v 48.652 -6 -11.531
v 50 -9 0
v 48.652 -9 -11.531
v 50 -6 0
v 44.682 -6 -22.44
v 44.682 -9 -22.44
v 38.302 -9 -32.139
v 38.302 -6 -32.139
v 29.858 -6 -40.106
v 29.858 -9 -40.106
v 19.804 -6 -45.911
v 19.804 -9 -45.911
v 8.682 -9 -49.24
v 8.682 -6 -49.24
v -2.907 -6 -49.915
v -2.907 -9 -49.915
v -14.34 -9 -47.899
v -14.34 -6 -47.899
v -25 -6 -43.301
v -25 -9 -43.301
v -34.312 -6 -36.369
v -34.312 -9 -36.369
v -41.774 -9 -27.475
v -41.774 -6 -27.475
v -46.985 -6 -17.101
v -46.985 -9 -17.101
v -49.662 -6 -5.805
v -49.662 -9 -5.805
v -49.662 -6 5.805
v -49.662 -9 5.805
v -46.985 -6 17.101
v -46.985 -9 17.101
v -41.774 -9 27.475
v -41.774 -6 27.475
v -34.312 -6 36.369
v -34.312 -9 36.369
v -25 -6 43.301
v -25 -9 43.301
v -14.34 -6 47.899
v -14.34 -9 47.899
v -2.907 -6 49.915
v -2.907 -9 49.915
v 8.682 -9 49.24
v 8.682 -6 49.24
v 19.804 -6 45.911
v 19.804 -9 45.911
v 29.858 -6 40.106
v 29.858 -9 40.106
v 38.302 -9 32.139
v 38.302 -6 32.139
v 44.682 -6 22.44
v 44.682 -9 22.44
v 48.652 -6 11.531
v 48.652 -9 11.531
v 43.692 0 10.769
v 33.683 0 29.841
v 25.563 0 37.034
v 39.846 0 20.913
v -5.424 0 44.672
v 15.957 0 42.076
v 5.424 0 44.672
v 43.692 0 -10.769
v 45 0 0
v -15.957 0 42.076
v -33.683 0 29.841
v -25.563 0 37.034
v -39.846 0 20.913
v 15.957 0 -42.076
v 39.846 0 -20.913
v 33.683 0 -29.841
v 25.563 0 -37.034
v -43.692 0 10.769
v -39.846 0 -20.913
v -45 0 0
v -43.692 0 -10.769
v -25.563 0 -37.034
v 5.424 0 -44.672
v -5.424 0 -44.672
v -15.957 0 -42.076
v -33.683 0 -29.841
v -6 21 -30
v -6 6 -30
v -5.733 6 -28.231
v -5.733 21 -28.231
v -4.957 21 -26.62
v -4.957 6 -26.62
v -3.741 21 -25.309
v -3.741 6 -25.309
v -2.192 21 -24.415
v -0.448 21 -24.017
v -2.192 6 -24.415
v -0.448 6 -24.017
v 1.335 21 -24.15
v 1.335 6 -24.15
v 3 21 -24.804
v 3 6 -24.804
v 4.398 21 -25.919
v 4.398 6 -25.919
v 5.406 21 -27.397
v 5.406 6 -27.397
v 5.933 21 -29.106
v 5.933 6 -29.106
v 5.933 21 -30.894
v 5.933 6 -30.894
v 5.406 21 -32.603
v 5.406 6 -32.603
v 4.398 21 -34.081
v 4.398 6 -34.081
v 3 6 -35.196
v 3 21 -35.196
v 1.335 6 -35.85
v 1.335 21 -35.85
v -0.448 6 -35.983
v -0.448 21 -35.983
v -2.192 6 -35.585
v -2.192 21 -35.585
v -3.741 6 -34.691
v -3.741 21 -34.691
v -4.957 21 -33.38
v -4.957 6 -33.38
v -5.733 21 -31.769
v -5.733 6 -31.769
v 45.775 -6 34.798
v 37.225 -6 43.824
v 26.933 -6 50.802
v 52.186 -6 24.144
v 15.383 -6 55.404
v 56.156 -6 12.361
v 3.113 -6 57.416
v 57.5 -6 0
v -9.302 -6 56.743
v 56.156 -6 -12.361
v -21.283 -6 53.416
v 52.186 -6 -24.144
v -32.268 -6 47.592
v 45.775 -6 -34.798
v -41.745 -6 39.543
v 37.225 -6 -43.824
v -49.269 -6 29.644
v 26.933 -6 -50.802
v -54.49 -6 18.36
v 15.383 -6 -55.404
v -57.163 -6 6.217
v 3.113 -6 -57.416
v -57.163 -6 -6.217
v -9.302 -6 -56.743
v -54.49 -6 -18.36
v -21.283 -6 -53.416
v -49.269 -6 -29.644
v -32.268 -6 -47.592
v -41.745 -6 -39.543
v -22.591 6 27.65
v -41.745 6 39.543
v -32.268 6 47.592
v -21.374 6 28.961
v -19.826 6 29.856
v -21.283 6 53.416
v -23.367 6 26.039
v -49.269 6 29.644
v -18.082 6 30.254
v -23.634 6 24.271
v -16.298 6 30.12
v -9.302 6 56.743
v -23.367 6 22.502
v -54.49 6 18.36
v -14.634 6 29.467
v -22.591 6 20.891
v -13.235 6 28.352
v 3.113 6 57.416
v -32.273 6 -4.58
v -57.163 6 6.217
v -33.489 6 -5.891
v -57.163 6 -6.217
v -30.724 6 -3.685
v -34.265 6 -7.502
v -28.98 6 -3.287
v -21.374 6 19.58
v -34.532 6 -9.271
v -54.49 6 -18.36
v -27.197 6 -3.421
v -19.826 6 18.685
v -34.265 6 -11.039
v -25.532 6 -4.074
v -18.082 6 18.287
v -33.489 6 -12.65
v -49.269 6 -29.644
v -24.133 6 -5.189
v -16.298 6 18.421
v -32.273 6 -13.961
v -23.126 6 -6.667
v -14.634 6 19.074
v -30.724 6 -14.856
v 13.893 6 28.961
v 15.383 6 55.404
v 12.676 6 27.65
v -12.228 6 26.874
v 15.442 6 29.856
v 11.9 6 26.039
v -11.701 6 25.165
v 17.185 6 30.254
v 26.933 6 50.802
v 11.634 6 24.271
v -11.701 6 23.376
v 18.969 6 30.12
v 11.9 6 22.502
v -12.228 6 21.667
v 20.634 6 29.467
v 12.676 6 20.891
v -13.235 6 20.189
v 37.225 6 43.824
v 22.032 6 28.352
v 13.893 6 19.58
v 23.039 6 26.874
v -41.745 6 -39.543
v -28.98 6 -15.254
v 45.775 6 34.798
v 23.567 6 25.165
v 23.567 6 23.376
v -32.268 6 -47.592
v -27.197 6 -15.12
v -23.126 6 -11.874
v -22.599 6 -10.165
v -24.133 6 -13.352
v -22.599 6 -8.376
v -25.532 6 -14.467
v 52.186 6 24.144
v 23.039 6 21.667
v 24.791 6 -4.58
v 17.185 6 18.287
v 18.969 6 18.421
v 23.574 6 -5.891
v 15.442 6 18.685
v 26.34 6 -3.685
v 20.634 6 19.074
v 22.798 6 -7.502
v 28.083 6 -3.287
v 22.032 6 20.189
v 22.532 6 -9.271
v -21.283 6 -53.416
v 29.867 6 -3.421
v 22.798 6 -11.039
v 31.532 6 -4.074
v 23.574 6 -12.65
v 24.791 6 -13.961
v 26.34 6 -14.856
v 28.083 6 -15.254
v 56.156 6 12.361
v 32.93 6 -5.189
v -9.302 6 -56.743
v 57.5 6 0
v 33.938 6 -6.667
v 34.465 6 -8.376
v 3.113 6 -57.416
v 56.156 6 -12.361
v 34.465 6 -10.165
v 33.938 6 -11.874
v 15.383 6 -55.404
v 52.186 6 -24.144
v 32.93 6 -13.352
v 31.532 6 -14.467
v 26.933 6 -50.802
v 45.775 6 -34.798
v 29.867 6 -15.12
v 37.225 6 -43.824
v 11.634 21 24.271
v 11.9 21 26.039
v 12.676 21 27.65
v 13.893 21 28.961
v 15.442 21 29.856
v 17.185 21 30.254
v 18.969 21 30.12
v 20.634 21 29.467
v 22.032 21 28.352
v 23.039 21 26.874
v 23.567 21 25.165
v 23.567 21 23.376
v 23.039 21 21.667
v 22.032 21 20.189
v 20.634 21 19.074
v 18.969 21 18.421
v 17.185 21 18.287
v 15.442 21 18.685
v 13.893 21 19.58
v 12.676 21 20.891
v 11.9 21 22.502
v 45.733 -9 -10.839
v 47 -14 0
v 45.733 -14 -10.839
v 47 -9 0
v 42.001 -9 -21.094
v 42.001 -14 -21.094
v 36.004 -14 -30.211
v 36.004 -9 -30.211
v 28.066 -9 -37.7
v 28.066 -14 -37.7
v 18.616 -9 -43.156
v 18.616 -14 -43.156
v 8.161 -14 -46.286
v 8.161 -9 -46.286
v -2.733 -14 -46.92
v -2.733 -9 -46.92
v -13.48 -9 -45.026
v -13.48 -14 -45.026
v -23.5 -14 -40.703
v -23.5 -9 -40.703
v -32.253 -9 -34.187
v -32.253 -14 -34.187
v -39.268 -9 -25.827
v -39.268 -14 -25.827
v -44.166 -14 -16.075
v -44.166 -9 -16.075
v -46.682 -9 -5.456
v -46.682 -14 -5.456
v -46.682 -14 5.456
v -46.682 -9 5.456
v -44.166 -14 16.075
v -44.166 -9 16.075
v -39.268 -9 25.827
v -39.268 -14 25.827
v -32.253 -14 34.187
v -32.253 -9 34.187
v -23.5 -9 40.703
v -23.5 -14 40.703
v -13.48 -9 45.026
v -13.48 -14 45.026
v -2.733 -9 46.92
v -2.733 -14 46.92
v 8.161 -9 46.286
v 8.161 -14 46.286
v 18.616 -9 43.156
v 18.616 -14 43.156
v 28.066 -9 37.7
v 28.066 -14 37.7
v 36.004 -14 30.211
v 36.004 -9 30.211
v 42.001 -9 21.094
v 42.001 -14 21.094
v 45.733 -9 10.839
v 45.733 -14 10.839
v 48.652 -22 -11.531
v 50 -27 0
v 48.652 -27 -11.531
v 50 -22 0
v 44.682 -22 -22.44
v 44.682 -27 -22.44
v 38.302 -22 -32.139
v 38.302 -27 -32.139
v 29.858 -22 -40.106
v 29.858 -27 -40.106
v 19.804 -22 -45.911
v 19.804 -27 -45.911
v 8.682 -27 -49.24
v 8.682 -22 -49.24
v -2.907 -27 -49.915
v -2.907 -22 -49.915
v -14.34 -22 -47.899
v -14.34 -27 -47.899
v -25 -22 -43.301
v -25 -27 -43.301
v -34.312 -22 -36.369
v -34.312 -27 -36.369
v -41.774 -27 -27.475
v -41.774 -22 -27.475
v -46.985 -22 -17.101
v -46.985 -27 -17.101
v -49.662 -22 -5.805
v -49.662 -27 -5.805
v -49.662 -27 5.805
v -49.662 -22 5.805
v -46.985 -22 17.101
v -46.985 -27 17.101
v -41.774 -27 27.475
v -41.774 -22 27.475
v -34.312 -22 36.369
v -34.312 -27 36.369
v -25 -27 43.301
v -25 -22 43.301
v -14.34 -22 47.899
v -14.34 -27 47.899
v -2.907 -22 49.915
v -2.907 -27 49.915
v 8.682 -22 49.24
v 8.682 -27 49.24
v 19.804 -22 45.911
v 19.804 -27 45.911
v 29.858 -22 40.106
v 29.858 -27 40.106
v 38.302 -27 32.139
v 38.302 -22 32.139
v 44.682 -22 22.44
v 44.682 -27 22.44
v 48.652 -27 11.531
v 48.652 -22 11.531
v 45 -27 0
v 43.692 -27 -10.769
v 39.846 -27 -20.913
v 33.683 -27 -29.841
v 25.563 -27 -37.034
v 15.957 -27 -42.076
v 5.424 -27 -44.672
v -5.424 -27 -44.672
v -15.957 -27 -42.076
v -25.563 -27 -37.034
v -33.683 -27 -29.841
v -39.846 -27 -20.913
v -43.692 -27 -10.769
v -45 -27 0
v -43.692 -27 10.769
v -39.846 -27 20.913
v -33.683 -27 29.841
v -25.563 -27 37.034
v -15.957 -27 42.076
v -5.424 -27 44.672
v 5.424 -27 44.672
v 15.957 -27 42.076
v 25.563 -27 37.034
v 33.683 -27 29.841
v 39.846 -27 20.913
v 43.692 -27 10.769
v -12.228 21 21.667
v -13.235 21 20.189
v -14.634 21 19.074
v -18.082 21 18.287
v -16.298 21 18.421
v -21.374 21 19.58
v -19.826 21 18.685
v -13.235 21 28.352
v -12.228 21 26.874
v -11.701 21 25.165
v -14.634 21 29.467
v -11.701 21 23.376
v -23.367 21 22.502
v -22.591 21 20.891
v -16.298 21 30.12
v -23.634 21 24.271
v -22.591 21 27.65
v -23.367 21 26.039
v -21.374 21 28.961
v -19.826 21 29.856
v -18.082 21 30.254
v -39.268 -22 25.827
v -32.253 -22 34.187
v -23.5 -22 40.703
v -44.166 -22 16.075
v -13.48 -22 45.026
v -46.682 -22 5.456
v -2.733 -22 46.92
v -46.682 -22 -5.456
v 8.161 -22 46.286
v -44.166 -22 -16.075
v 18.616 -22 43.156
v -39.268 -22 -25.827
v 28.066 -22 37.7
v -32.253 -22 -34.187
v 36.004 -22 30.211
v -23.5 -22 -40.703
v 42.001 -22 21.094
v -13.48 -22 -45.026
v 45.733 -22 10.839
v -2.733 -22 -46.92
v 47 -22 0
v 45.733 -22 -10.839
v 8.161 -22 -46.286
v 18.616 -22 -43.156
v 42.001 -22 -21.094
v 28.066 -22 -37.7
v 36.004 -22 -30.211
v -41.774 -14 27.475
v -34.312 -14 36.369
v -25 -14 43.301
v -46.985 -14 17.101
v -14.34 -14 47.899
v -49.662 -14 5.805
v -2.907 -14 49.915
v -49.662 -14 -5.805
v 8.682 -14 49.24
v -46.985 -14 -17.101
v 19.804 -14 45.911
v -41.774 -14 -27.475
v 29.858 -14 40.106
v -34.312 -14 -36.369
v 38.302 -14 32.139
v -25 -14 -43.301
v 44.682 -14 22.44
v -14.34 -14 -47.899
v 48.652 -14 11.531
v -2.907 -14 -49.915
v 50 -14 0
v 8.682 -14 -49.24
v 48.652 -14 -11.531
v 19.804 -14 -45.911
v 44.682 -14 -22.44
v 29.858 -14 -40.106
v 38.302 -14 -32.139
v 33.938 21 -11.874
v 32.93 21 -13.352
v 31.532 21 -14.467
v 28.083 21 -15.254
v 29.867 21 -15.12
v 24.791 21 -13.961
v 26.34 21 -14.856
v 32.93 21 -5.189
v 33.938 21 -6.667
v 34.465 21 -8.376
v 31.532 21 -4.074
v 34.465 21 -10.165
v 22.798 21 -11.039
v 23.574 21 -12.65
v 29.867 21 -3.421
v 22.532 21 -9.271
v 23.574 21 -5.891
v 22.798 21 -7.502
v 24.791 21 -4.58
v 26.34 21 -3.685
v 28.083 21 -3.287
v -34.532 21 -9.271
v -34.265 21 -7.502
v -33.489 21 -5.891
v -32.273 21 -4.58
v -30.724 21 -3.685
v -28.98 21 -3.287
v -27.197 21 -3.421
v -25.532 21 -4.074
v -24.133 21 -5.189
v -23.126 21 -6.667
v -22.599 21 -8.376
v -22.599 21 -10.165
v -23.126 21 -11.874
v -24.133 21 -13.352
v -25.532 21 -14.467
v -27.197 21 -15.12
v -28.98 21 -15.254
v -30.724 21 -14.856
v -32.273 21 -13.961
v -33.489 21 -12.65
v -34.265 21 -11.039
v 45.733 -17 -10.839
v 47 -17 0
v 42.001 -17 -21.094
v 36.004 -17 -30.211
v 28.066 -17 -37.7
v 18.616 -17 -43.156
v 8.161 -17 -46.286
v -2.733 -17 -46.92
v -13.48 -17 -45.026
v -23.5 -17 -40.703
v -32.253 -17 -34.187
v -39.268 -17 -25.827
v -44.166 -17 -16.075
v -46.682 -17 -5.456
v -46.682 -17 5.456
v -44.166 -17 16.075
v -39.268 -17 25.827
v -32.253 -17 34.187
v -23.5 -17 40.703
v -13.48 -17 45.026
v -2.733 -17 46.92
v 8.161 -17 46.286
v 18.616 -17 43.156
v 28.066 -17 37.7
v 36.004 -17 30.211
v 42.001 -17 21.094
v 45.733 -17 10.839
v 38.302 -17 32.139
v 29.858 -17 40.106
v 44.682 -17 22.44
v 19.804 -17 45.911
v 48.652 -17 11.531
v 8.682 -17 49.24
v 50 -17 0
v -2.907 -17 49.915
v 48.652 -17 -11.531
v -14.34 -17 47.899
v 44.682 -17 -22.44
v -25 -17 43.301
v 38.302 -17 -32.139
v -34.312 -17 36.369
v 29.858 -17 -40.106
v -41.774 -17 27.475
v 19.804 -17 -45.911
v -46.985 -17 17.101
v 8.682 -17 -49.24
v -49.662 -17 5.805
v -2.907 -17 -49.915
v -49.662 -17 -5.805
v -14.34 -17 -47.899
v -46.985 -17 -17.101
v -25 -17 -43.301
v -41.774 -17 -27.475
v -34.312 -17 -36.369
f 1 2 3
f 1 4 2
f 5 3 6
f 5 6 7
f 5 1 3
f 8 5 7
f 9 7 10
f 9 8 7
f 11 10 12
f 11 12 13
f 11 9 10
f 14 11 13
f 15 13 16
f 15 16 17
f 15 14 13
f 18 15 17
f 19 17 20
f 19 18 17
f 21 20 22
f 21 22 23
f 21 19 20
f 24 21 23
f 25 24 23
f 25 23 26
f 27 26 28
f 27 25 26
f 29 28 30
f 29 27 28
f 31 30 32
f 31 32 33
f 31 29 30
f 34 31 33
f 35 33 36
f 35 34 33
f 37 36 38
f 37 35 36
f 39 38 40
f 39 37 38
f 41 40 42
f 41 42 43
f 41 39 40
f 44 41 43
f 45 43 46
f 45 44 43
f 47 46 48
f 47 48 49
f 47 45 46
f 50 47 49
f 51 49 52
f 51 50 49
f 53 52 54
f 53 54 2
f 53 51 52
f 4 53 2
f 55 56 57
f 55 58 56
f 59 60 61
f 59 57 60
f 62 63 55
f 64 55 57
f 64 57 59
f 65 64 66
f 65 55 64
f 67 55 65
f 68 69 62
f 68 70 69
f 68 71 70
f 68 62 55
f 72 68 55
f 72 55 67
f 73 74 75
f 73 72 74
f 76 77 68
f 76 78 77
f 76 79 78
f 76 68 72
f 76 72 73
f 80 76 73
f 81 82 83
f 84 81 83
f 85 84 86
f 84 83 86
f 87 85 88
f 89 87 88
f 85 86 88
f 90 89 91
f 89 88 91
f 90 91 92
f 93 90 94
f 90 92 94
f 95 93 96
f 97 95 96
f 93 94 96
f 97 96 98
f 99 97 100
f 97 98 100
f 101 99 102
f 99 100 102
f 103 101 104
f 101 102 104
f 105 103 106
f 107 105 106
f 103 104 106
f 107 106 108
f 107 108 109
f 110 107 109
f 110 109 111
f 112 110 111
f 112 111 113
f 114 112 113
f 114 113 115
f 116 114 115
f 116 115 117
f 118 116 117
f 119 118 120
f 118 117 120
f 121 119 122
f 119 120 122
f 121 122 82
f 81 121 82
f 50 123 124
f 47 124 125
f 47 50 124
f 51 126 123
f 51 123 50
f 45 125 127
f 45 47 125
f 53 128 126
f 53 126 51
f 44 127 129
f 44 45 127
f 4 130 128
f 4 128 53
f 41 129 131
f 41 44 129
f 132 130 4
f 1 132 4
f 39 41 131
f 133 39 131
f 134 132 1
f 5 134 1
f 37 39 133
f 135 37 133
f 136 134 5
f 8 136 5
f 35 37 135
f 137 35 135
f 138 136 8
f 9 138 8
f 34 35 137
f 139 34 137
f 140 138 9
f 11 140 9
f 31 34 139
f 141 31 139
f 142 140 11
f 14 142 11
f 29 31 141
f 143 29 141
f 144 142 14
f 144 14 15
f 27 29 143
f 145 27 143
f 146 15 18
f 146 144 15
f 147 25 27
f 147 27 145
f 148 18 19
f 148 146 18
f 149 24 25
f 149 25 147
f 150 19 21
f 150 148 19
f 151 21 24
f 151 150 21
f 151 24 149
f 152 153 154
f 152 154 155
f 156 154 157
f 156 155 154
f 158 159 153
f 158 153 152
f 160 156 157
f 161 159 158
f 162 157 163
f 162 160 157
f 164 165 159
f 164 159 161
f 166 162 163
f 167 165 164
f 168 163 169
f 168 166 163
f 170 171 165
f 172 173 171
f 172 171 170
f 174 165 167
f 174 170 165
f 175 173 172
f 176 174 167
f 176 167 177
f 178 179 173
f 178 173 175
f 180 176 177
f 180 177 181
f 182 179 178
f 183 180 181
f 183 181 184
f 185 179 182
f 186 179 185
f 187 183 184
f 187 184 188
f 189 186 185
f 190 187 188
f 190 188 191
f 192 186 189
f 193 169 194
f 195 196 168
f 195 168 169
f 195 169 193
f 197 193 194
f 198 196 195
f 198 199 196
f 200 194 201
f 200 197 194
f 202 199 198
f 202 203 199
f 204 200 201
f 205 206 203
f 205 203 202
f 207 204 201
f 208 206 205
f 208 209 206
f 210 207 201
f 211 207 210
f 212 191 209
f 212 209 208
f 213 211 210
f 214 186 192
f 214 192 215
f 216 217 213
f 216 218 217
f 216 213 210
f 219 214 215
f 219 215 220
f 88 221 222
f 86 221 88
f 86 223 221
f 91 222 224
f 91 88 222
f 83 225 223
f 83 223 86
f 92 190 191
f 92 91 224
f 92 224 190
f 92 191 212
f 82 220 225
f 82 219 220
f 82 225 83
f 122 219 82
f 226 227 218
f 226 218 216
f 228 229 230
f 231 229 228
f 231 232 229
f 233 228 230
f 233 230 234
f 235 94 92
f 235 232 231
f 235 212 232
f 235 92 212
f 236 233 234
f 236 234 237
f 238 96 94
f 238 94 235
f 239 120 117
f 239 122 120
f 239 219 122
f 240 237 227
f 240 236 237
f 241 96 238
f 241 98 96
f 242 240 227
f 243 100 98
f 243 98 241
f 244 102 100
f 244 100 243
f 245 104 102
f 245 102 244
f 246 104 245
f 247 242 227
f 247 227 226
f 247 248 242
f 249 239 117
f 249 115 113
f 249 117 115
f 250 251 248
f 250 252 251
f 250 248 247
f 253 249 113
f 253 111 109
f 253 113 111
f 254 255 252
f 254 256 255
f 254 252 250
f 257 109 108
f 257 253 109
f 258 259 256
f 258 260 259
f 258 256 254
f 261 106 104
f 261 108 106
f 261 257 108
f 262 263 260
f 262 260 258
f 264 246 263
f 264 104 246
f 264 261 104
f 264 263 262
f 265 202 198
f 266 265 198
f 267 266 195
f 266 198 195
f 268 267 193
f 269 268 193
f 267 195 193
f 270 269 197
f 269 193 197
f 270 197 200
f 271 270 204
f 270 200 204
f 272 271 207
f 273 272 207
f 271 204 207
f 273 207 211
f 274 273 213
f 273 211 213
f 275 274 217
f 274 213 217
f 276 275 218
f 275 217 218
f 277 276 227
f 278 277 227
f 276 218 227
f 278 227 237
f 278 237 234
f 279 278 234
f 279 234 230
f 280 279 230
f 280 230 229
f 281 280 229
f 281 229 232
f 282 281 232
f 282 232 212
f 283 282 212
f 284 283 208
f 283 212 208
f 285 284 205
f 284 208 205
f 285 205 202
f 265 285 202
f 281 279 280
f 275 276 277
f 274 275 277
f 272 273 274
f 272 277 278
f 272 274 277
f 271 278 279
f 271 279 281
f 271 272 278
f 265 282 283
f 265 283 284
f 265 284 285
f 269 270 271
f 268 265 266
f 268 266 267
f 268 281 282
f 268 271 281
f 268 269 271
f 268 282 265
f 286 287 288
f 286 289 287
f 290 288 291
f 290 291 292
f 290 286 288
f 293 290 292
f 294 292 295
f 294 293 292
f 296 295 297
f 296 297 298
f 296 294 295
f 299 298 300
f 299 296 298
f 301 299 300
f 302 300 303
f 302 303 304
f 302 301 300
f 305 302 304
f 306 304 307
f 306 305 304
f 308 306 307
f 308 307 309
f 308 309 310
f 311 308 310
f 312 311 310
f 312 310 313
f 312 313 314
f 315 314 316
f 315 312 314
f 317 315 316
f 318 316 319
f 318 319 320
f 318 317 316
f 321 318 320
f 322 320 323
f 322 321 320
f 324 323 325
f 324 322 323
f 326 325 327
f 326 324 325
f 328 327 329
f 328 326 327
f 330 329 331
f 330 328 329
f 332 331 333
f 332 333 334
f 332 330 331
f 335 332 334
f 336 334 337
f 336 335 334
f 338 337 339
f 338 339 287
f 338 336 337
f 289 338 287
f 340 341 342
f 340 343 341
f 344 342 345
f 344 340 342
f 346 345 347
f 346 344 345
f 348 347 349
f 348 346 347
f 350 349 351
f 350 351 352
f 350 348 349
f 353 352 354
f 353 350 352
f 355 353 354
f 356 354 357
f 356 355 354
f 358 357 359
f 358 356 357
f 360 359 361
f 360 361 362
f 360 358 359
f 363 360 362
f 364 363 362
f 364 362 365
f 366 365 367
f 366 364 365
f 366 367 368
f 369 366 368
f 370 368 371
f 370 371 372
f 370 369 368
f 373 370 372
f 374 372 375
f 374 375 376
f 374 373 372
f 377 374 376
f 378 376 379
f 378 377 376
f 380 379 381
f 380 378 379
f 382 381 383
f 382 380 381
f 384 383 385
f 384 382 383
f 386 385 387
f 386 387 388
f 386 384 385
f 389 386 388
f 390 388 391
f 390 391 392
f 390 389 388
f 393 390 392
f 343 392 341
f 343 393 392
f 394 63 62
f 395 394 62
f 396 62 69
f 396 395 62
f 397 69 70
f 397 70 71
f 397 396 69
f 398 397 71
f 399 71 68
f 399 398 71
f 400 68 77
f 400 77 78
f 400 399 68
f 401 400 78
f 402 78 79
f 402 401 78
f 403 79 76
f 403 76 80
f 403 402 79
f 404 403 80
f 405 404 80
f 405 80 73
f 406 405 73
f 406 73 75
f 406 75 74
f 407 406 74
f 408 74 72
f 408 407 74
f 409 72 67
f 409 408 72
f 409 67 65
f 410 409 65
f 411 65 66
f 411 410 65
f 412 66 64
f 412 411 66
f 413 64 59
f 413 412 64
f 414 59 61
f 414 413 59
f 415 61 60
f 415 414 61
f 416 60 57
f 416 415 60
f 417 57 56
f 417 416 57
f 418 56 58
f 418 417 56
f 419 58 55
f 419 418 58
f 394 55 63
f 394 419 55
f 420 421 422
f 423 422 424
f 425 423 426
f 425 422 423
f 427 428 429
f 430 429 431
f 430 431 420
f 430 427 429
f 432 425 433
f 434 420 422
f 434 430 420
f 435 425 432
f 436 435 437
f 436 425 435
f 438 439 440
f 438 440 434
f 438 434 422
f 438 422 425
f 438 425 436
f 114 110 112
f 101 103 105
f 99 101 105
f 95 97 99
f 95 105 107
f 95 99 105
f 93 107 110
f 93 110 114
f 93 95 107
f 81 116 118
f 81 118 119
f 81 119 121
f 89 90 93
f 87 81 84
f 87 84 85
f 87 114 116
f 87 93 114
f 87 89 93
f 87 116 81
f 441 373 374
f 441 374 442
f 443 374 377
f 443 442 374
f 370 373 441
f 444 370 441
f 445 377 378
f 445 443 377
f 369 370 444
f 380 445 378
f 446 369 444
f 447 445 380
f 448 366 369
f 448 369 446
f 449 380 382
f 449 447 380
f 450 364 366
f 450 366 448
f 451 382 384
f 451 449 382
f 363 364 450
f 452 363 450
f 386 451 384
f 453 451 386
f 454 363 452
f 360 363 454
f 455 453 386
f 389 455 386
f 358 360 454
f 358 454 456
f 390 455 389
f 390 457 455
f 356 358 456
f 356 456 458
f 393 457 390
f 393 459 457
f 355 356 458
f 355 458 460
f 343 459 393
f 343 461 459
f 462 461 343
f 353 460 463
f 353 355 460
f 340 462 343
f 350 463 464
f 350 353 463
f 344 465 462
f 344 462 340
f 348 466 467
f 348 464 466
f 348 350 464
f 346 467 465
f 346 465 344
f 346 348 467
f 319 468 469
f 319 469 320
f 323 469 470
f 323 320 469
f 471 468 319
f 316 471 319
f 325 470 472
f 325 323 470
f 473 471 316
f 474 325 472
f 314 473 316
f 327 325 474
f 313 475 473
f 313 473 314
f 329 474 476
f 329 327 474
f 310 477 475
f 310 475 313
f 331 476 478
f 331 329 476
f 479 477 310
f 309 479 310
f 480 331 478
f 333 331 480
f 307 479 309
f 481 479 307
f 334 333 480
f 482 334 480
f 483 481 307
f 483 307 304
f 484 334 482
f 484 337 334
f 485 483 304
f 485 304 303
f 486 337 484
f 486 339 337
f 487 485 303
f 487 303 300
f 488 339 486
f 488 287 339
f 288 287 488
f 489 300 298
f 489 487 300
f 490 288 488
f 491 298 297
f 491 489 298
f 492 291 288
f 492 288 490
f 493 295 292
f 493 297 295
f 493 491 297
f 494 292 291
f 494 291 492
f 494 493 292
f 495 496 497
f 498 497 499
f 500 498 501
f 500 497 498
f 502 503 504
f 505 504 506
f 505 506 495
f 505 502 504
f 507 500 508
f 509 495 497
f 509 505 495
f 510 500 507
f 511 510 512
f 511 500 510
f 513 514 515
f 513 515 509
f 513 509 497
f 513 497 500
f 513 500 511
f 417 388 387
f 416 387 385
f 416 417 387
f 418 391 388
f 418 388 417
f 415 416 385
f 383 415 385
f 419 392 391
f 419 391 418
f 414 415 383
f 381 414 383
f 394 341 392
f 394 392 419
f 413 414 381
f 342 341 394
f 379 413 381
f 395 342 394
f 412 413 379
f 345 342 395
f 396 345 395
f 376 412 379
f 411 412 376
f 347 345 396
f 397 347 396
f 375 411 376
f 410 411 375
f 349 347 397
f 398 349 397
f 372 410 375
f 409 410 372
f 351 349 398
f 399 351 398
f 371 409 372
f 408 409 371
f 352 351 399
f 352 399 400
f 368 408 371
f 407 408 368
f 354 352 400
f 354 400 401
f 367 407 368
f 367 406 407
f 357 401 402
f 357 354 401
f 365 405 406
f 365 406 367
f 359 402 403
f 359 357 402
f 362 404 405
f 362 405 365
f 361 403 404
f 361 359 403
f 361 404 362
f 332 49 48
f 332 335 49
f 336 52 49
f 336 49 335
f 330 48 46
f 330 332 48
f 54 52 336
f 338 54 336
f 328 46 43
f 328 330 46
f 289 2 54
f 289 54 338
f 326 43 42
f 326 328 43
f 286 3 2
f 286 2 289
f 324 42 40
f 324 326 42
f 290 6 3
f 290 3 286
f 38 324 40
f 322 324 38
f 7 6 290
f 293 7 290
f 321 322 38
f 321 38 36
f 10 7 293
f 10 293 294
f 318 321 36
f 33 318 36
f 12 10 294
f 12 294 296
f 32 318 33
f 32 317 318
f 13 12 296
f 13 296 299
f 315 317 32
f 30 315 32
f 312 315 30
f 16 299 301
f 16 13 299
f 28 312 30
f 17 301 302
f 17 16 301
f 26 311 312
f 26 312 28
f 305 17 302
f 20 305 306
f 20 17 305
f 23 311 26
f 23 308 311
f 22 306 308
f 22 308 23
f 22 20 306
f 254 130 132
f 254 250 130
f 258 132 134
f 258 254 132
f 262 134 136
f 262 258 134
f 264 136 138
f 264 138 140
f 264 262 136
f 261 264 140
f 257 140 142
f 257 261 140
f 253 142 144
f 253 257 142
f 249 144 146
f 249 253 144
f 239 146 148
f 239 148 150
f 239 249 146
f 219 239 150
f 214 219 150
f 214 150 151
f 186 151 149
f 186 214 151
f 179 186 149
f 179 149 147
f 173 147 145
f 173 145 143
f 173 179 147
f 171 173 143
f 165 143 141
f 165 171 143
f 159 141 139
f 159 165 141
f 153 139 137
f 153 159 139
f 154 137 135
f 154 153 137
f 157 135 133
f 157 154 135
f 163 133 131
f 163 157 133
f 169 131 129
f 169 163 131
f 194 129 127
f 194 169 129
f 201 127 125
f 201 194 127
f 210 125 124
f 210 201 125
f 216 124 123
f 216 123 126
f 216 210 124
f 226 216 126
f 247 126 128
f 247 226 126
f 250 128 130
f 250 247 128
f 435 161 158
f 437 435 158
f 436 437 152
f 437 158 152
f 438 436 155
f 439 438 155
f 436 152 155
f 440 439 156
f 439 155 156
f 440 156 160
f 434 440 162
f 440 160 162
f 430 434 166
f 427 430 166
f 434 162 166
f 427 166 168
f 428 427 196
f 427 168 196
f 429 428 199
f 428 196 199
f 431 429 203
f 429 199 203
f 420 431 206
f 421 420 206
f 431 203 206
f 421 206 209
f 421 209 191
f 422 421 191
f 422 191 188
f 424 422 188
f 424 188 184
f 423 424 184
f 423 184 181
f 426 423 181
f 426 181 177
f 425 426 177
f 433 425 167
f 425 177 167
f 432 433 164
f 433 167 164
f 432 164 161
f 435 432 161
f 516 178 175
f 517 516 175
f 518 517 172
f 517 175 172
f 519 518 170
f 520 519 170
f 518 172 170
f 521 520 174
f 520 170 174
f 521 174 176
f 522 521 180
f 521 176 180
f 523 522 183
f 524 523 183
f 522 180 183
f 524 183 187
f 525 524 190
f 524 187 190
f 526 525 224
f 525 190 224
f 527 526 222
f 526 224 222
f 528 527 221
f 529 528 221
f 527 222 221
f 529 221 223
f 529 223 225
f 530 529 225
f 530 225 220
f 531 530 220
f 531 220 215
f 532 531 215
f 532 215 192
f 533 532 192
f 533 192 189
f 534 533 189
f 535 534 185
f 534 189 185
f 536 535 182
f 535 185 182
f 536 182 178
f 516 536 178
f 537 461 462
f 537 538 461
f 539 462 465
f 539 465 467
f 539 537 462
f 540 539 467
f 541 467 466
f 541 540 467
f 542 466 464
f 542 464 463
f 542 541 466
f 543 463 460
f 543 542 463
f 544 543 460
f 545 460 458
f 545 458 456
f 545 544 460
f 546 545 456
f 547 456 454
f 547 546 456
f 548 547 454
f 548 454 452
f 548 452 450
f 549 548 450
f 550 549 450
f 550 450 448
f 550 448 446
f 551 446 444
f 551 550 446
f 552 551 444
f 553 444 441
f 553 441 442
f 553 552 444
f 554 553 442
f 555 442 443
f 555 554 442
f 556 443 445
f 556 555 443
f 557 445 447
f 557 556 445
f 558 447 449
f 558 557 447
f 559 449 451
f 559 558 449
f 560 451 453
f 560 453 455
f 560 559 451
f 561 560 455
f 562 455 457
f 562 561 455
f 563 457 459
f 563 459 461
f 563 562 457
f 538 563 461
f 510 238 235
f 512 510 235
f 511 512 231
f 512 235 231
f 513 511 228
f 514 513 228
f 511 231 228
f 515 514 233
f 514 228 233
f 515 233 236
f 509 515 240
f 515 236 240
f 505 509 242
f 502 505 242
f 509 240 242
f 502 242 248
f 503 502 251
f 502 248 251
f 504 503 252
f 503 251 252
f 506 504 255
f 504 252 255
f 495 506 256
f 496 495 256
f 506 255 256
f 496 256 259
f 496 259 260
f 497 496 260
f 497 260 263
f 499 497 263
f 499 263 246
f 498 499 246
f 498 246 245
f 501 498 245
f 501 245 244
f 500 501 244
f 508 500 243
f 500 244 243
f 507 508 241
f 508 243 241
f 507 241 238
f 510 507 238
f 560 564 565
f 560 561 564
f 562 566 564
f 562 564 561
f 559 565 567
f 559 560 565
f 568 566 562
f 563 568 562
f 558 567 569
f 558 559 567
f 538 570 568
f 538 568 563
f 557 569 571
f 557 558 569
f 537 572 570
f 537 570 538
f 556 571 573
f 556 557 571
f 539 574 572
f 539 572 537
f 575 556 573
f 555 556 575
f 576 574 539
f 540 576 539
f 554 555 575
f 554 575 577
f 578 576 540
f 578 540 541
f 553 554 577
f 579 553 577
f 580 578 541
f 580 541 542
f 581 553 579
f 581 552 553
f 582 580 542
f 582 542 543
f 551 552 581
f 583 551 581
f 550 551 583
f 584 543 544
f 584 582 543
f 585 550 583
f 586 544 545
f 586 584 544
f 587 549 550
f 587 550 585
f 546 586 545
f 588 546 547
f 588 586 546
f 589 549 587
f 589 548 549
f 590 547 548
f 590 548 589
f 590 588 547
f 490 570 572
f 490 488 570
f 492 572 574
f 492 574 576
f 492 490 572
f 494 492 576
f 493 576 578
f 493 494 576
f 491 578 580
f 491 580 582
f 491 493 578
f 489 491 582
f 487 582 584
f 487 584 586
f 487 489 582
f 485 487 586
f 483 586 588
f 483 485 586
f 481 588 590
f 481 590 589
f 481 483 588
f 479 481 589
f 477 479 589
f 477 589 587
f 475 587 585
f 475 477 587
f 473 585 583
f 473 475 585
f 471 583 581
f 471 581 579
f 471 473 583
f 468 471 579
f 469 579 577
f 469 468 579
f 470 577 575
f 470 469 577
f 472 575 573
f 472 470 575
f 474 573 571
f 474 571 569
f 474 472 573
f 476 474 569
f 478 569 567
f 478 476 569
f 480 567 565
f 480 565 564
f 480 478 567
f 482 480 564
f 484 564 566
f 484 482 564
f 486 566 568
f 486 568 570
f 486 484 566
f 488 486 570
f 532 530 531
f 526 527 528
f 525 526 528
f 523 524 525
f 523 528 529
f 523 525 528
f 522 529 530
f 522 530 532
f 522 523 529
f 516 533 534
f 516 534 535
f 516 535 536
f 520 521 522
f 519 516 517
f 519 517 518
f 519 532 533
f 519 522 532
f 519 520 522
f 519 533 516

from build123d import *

# Parameters (mm, degrees)
ESQUISSE2_R        = 6
BOSS_EXTRU_1_DEPTH = 15


with BuildPart() as part:
    # Esquisse1 → Révolution1 (revolve)
    with BuildSketch(Plane.XY):
        Polygon((0, 0), (45, 0), (45, -27), (50, -27), (50, -22), (47, -22), (47, -17), (50, -17), (50, -14), (47, -14), (47, -9), (50, -9), (50, -6), (57.5, -6), (57.5, 6), (0, 6), align=None)
    revolve(axis=Axis((0, 0, 0), (0, 1, 0)))

    # Esquisse2 → Boss.-Extru.1 (add)
    with BuildSketch(Plane(origin=(0, 6, 0), x_dir=(1, 0, 0), z_dir=(0, 1, 0))):
        with Locations(Location((0, 30, 0), (0, 0, 180))):
            Circle(ESQUISSE2_R)
        with Locations(Location((28.531695489, 9.270509831, 0), (0, 0, 180))):
            Circle(ESQUISSE2_R)
        with Locations(Location((17.633557569, -24.270509831, 0), (0, 0, 180))):
            Circle(ESQUISSE2_R)
        with Locations(Location((-17.633557569, -24.270509831, 0), (0, 0, 180))):
            Circle(ESQUISSE2_R)
        with Locations(Location((-28.531695489, 9.270509831, 0), (0, 0, 180))):
            Circle(ESQUISSE2_R)
    extrude(amount=BOSS_EXTRU_1_DEPTH)


solid = part.part
